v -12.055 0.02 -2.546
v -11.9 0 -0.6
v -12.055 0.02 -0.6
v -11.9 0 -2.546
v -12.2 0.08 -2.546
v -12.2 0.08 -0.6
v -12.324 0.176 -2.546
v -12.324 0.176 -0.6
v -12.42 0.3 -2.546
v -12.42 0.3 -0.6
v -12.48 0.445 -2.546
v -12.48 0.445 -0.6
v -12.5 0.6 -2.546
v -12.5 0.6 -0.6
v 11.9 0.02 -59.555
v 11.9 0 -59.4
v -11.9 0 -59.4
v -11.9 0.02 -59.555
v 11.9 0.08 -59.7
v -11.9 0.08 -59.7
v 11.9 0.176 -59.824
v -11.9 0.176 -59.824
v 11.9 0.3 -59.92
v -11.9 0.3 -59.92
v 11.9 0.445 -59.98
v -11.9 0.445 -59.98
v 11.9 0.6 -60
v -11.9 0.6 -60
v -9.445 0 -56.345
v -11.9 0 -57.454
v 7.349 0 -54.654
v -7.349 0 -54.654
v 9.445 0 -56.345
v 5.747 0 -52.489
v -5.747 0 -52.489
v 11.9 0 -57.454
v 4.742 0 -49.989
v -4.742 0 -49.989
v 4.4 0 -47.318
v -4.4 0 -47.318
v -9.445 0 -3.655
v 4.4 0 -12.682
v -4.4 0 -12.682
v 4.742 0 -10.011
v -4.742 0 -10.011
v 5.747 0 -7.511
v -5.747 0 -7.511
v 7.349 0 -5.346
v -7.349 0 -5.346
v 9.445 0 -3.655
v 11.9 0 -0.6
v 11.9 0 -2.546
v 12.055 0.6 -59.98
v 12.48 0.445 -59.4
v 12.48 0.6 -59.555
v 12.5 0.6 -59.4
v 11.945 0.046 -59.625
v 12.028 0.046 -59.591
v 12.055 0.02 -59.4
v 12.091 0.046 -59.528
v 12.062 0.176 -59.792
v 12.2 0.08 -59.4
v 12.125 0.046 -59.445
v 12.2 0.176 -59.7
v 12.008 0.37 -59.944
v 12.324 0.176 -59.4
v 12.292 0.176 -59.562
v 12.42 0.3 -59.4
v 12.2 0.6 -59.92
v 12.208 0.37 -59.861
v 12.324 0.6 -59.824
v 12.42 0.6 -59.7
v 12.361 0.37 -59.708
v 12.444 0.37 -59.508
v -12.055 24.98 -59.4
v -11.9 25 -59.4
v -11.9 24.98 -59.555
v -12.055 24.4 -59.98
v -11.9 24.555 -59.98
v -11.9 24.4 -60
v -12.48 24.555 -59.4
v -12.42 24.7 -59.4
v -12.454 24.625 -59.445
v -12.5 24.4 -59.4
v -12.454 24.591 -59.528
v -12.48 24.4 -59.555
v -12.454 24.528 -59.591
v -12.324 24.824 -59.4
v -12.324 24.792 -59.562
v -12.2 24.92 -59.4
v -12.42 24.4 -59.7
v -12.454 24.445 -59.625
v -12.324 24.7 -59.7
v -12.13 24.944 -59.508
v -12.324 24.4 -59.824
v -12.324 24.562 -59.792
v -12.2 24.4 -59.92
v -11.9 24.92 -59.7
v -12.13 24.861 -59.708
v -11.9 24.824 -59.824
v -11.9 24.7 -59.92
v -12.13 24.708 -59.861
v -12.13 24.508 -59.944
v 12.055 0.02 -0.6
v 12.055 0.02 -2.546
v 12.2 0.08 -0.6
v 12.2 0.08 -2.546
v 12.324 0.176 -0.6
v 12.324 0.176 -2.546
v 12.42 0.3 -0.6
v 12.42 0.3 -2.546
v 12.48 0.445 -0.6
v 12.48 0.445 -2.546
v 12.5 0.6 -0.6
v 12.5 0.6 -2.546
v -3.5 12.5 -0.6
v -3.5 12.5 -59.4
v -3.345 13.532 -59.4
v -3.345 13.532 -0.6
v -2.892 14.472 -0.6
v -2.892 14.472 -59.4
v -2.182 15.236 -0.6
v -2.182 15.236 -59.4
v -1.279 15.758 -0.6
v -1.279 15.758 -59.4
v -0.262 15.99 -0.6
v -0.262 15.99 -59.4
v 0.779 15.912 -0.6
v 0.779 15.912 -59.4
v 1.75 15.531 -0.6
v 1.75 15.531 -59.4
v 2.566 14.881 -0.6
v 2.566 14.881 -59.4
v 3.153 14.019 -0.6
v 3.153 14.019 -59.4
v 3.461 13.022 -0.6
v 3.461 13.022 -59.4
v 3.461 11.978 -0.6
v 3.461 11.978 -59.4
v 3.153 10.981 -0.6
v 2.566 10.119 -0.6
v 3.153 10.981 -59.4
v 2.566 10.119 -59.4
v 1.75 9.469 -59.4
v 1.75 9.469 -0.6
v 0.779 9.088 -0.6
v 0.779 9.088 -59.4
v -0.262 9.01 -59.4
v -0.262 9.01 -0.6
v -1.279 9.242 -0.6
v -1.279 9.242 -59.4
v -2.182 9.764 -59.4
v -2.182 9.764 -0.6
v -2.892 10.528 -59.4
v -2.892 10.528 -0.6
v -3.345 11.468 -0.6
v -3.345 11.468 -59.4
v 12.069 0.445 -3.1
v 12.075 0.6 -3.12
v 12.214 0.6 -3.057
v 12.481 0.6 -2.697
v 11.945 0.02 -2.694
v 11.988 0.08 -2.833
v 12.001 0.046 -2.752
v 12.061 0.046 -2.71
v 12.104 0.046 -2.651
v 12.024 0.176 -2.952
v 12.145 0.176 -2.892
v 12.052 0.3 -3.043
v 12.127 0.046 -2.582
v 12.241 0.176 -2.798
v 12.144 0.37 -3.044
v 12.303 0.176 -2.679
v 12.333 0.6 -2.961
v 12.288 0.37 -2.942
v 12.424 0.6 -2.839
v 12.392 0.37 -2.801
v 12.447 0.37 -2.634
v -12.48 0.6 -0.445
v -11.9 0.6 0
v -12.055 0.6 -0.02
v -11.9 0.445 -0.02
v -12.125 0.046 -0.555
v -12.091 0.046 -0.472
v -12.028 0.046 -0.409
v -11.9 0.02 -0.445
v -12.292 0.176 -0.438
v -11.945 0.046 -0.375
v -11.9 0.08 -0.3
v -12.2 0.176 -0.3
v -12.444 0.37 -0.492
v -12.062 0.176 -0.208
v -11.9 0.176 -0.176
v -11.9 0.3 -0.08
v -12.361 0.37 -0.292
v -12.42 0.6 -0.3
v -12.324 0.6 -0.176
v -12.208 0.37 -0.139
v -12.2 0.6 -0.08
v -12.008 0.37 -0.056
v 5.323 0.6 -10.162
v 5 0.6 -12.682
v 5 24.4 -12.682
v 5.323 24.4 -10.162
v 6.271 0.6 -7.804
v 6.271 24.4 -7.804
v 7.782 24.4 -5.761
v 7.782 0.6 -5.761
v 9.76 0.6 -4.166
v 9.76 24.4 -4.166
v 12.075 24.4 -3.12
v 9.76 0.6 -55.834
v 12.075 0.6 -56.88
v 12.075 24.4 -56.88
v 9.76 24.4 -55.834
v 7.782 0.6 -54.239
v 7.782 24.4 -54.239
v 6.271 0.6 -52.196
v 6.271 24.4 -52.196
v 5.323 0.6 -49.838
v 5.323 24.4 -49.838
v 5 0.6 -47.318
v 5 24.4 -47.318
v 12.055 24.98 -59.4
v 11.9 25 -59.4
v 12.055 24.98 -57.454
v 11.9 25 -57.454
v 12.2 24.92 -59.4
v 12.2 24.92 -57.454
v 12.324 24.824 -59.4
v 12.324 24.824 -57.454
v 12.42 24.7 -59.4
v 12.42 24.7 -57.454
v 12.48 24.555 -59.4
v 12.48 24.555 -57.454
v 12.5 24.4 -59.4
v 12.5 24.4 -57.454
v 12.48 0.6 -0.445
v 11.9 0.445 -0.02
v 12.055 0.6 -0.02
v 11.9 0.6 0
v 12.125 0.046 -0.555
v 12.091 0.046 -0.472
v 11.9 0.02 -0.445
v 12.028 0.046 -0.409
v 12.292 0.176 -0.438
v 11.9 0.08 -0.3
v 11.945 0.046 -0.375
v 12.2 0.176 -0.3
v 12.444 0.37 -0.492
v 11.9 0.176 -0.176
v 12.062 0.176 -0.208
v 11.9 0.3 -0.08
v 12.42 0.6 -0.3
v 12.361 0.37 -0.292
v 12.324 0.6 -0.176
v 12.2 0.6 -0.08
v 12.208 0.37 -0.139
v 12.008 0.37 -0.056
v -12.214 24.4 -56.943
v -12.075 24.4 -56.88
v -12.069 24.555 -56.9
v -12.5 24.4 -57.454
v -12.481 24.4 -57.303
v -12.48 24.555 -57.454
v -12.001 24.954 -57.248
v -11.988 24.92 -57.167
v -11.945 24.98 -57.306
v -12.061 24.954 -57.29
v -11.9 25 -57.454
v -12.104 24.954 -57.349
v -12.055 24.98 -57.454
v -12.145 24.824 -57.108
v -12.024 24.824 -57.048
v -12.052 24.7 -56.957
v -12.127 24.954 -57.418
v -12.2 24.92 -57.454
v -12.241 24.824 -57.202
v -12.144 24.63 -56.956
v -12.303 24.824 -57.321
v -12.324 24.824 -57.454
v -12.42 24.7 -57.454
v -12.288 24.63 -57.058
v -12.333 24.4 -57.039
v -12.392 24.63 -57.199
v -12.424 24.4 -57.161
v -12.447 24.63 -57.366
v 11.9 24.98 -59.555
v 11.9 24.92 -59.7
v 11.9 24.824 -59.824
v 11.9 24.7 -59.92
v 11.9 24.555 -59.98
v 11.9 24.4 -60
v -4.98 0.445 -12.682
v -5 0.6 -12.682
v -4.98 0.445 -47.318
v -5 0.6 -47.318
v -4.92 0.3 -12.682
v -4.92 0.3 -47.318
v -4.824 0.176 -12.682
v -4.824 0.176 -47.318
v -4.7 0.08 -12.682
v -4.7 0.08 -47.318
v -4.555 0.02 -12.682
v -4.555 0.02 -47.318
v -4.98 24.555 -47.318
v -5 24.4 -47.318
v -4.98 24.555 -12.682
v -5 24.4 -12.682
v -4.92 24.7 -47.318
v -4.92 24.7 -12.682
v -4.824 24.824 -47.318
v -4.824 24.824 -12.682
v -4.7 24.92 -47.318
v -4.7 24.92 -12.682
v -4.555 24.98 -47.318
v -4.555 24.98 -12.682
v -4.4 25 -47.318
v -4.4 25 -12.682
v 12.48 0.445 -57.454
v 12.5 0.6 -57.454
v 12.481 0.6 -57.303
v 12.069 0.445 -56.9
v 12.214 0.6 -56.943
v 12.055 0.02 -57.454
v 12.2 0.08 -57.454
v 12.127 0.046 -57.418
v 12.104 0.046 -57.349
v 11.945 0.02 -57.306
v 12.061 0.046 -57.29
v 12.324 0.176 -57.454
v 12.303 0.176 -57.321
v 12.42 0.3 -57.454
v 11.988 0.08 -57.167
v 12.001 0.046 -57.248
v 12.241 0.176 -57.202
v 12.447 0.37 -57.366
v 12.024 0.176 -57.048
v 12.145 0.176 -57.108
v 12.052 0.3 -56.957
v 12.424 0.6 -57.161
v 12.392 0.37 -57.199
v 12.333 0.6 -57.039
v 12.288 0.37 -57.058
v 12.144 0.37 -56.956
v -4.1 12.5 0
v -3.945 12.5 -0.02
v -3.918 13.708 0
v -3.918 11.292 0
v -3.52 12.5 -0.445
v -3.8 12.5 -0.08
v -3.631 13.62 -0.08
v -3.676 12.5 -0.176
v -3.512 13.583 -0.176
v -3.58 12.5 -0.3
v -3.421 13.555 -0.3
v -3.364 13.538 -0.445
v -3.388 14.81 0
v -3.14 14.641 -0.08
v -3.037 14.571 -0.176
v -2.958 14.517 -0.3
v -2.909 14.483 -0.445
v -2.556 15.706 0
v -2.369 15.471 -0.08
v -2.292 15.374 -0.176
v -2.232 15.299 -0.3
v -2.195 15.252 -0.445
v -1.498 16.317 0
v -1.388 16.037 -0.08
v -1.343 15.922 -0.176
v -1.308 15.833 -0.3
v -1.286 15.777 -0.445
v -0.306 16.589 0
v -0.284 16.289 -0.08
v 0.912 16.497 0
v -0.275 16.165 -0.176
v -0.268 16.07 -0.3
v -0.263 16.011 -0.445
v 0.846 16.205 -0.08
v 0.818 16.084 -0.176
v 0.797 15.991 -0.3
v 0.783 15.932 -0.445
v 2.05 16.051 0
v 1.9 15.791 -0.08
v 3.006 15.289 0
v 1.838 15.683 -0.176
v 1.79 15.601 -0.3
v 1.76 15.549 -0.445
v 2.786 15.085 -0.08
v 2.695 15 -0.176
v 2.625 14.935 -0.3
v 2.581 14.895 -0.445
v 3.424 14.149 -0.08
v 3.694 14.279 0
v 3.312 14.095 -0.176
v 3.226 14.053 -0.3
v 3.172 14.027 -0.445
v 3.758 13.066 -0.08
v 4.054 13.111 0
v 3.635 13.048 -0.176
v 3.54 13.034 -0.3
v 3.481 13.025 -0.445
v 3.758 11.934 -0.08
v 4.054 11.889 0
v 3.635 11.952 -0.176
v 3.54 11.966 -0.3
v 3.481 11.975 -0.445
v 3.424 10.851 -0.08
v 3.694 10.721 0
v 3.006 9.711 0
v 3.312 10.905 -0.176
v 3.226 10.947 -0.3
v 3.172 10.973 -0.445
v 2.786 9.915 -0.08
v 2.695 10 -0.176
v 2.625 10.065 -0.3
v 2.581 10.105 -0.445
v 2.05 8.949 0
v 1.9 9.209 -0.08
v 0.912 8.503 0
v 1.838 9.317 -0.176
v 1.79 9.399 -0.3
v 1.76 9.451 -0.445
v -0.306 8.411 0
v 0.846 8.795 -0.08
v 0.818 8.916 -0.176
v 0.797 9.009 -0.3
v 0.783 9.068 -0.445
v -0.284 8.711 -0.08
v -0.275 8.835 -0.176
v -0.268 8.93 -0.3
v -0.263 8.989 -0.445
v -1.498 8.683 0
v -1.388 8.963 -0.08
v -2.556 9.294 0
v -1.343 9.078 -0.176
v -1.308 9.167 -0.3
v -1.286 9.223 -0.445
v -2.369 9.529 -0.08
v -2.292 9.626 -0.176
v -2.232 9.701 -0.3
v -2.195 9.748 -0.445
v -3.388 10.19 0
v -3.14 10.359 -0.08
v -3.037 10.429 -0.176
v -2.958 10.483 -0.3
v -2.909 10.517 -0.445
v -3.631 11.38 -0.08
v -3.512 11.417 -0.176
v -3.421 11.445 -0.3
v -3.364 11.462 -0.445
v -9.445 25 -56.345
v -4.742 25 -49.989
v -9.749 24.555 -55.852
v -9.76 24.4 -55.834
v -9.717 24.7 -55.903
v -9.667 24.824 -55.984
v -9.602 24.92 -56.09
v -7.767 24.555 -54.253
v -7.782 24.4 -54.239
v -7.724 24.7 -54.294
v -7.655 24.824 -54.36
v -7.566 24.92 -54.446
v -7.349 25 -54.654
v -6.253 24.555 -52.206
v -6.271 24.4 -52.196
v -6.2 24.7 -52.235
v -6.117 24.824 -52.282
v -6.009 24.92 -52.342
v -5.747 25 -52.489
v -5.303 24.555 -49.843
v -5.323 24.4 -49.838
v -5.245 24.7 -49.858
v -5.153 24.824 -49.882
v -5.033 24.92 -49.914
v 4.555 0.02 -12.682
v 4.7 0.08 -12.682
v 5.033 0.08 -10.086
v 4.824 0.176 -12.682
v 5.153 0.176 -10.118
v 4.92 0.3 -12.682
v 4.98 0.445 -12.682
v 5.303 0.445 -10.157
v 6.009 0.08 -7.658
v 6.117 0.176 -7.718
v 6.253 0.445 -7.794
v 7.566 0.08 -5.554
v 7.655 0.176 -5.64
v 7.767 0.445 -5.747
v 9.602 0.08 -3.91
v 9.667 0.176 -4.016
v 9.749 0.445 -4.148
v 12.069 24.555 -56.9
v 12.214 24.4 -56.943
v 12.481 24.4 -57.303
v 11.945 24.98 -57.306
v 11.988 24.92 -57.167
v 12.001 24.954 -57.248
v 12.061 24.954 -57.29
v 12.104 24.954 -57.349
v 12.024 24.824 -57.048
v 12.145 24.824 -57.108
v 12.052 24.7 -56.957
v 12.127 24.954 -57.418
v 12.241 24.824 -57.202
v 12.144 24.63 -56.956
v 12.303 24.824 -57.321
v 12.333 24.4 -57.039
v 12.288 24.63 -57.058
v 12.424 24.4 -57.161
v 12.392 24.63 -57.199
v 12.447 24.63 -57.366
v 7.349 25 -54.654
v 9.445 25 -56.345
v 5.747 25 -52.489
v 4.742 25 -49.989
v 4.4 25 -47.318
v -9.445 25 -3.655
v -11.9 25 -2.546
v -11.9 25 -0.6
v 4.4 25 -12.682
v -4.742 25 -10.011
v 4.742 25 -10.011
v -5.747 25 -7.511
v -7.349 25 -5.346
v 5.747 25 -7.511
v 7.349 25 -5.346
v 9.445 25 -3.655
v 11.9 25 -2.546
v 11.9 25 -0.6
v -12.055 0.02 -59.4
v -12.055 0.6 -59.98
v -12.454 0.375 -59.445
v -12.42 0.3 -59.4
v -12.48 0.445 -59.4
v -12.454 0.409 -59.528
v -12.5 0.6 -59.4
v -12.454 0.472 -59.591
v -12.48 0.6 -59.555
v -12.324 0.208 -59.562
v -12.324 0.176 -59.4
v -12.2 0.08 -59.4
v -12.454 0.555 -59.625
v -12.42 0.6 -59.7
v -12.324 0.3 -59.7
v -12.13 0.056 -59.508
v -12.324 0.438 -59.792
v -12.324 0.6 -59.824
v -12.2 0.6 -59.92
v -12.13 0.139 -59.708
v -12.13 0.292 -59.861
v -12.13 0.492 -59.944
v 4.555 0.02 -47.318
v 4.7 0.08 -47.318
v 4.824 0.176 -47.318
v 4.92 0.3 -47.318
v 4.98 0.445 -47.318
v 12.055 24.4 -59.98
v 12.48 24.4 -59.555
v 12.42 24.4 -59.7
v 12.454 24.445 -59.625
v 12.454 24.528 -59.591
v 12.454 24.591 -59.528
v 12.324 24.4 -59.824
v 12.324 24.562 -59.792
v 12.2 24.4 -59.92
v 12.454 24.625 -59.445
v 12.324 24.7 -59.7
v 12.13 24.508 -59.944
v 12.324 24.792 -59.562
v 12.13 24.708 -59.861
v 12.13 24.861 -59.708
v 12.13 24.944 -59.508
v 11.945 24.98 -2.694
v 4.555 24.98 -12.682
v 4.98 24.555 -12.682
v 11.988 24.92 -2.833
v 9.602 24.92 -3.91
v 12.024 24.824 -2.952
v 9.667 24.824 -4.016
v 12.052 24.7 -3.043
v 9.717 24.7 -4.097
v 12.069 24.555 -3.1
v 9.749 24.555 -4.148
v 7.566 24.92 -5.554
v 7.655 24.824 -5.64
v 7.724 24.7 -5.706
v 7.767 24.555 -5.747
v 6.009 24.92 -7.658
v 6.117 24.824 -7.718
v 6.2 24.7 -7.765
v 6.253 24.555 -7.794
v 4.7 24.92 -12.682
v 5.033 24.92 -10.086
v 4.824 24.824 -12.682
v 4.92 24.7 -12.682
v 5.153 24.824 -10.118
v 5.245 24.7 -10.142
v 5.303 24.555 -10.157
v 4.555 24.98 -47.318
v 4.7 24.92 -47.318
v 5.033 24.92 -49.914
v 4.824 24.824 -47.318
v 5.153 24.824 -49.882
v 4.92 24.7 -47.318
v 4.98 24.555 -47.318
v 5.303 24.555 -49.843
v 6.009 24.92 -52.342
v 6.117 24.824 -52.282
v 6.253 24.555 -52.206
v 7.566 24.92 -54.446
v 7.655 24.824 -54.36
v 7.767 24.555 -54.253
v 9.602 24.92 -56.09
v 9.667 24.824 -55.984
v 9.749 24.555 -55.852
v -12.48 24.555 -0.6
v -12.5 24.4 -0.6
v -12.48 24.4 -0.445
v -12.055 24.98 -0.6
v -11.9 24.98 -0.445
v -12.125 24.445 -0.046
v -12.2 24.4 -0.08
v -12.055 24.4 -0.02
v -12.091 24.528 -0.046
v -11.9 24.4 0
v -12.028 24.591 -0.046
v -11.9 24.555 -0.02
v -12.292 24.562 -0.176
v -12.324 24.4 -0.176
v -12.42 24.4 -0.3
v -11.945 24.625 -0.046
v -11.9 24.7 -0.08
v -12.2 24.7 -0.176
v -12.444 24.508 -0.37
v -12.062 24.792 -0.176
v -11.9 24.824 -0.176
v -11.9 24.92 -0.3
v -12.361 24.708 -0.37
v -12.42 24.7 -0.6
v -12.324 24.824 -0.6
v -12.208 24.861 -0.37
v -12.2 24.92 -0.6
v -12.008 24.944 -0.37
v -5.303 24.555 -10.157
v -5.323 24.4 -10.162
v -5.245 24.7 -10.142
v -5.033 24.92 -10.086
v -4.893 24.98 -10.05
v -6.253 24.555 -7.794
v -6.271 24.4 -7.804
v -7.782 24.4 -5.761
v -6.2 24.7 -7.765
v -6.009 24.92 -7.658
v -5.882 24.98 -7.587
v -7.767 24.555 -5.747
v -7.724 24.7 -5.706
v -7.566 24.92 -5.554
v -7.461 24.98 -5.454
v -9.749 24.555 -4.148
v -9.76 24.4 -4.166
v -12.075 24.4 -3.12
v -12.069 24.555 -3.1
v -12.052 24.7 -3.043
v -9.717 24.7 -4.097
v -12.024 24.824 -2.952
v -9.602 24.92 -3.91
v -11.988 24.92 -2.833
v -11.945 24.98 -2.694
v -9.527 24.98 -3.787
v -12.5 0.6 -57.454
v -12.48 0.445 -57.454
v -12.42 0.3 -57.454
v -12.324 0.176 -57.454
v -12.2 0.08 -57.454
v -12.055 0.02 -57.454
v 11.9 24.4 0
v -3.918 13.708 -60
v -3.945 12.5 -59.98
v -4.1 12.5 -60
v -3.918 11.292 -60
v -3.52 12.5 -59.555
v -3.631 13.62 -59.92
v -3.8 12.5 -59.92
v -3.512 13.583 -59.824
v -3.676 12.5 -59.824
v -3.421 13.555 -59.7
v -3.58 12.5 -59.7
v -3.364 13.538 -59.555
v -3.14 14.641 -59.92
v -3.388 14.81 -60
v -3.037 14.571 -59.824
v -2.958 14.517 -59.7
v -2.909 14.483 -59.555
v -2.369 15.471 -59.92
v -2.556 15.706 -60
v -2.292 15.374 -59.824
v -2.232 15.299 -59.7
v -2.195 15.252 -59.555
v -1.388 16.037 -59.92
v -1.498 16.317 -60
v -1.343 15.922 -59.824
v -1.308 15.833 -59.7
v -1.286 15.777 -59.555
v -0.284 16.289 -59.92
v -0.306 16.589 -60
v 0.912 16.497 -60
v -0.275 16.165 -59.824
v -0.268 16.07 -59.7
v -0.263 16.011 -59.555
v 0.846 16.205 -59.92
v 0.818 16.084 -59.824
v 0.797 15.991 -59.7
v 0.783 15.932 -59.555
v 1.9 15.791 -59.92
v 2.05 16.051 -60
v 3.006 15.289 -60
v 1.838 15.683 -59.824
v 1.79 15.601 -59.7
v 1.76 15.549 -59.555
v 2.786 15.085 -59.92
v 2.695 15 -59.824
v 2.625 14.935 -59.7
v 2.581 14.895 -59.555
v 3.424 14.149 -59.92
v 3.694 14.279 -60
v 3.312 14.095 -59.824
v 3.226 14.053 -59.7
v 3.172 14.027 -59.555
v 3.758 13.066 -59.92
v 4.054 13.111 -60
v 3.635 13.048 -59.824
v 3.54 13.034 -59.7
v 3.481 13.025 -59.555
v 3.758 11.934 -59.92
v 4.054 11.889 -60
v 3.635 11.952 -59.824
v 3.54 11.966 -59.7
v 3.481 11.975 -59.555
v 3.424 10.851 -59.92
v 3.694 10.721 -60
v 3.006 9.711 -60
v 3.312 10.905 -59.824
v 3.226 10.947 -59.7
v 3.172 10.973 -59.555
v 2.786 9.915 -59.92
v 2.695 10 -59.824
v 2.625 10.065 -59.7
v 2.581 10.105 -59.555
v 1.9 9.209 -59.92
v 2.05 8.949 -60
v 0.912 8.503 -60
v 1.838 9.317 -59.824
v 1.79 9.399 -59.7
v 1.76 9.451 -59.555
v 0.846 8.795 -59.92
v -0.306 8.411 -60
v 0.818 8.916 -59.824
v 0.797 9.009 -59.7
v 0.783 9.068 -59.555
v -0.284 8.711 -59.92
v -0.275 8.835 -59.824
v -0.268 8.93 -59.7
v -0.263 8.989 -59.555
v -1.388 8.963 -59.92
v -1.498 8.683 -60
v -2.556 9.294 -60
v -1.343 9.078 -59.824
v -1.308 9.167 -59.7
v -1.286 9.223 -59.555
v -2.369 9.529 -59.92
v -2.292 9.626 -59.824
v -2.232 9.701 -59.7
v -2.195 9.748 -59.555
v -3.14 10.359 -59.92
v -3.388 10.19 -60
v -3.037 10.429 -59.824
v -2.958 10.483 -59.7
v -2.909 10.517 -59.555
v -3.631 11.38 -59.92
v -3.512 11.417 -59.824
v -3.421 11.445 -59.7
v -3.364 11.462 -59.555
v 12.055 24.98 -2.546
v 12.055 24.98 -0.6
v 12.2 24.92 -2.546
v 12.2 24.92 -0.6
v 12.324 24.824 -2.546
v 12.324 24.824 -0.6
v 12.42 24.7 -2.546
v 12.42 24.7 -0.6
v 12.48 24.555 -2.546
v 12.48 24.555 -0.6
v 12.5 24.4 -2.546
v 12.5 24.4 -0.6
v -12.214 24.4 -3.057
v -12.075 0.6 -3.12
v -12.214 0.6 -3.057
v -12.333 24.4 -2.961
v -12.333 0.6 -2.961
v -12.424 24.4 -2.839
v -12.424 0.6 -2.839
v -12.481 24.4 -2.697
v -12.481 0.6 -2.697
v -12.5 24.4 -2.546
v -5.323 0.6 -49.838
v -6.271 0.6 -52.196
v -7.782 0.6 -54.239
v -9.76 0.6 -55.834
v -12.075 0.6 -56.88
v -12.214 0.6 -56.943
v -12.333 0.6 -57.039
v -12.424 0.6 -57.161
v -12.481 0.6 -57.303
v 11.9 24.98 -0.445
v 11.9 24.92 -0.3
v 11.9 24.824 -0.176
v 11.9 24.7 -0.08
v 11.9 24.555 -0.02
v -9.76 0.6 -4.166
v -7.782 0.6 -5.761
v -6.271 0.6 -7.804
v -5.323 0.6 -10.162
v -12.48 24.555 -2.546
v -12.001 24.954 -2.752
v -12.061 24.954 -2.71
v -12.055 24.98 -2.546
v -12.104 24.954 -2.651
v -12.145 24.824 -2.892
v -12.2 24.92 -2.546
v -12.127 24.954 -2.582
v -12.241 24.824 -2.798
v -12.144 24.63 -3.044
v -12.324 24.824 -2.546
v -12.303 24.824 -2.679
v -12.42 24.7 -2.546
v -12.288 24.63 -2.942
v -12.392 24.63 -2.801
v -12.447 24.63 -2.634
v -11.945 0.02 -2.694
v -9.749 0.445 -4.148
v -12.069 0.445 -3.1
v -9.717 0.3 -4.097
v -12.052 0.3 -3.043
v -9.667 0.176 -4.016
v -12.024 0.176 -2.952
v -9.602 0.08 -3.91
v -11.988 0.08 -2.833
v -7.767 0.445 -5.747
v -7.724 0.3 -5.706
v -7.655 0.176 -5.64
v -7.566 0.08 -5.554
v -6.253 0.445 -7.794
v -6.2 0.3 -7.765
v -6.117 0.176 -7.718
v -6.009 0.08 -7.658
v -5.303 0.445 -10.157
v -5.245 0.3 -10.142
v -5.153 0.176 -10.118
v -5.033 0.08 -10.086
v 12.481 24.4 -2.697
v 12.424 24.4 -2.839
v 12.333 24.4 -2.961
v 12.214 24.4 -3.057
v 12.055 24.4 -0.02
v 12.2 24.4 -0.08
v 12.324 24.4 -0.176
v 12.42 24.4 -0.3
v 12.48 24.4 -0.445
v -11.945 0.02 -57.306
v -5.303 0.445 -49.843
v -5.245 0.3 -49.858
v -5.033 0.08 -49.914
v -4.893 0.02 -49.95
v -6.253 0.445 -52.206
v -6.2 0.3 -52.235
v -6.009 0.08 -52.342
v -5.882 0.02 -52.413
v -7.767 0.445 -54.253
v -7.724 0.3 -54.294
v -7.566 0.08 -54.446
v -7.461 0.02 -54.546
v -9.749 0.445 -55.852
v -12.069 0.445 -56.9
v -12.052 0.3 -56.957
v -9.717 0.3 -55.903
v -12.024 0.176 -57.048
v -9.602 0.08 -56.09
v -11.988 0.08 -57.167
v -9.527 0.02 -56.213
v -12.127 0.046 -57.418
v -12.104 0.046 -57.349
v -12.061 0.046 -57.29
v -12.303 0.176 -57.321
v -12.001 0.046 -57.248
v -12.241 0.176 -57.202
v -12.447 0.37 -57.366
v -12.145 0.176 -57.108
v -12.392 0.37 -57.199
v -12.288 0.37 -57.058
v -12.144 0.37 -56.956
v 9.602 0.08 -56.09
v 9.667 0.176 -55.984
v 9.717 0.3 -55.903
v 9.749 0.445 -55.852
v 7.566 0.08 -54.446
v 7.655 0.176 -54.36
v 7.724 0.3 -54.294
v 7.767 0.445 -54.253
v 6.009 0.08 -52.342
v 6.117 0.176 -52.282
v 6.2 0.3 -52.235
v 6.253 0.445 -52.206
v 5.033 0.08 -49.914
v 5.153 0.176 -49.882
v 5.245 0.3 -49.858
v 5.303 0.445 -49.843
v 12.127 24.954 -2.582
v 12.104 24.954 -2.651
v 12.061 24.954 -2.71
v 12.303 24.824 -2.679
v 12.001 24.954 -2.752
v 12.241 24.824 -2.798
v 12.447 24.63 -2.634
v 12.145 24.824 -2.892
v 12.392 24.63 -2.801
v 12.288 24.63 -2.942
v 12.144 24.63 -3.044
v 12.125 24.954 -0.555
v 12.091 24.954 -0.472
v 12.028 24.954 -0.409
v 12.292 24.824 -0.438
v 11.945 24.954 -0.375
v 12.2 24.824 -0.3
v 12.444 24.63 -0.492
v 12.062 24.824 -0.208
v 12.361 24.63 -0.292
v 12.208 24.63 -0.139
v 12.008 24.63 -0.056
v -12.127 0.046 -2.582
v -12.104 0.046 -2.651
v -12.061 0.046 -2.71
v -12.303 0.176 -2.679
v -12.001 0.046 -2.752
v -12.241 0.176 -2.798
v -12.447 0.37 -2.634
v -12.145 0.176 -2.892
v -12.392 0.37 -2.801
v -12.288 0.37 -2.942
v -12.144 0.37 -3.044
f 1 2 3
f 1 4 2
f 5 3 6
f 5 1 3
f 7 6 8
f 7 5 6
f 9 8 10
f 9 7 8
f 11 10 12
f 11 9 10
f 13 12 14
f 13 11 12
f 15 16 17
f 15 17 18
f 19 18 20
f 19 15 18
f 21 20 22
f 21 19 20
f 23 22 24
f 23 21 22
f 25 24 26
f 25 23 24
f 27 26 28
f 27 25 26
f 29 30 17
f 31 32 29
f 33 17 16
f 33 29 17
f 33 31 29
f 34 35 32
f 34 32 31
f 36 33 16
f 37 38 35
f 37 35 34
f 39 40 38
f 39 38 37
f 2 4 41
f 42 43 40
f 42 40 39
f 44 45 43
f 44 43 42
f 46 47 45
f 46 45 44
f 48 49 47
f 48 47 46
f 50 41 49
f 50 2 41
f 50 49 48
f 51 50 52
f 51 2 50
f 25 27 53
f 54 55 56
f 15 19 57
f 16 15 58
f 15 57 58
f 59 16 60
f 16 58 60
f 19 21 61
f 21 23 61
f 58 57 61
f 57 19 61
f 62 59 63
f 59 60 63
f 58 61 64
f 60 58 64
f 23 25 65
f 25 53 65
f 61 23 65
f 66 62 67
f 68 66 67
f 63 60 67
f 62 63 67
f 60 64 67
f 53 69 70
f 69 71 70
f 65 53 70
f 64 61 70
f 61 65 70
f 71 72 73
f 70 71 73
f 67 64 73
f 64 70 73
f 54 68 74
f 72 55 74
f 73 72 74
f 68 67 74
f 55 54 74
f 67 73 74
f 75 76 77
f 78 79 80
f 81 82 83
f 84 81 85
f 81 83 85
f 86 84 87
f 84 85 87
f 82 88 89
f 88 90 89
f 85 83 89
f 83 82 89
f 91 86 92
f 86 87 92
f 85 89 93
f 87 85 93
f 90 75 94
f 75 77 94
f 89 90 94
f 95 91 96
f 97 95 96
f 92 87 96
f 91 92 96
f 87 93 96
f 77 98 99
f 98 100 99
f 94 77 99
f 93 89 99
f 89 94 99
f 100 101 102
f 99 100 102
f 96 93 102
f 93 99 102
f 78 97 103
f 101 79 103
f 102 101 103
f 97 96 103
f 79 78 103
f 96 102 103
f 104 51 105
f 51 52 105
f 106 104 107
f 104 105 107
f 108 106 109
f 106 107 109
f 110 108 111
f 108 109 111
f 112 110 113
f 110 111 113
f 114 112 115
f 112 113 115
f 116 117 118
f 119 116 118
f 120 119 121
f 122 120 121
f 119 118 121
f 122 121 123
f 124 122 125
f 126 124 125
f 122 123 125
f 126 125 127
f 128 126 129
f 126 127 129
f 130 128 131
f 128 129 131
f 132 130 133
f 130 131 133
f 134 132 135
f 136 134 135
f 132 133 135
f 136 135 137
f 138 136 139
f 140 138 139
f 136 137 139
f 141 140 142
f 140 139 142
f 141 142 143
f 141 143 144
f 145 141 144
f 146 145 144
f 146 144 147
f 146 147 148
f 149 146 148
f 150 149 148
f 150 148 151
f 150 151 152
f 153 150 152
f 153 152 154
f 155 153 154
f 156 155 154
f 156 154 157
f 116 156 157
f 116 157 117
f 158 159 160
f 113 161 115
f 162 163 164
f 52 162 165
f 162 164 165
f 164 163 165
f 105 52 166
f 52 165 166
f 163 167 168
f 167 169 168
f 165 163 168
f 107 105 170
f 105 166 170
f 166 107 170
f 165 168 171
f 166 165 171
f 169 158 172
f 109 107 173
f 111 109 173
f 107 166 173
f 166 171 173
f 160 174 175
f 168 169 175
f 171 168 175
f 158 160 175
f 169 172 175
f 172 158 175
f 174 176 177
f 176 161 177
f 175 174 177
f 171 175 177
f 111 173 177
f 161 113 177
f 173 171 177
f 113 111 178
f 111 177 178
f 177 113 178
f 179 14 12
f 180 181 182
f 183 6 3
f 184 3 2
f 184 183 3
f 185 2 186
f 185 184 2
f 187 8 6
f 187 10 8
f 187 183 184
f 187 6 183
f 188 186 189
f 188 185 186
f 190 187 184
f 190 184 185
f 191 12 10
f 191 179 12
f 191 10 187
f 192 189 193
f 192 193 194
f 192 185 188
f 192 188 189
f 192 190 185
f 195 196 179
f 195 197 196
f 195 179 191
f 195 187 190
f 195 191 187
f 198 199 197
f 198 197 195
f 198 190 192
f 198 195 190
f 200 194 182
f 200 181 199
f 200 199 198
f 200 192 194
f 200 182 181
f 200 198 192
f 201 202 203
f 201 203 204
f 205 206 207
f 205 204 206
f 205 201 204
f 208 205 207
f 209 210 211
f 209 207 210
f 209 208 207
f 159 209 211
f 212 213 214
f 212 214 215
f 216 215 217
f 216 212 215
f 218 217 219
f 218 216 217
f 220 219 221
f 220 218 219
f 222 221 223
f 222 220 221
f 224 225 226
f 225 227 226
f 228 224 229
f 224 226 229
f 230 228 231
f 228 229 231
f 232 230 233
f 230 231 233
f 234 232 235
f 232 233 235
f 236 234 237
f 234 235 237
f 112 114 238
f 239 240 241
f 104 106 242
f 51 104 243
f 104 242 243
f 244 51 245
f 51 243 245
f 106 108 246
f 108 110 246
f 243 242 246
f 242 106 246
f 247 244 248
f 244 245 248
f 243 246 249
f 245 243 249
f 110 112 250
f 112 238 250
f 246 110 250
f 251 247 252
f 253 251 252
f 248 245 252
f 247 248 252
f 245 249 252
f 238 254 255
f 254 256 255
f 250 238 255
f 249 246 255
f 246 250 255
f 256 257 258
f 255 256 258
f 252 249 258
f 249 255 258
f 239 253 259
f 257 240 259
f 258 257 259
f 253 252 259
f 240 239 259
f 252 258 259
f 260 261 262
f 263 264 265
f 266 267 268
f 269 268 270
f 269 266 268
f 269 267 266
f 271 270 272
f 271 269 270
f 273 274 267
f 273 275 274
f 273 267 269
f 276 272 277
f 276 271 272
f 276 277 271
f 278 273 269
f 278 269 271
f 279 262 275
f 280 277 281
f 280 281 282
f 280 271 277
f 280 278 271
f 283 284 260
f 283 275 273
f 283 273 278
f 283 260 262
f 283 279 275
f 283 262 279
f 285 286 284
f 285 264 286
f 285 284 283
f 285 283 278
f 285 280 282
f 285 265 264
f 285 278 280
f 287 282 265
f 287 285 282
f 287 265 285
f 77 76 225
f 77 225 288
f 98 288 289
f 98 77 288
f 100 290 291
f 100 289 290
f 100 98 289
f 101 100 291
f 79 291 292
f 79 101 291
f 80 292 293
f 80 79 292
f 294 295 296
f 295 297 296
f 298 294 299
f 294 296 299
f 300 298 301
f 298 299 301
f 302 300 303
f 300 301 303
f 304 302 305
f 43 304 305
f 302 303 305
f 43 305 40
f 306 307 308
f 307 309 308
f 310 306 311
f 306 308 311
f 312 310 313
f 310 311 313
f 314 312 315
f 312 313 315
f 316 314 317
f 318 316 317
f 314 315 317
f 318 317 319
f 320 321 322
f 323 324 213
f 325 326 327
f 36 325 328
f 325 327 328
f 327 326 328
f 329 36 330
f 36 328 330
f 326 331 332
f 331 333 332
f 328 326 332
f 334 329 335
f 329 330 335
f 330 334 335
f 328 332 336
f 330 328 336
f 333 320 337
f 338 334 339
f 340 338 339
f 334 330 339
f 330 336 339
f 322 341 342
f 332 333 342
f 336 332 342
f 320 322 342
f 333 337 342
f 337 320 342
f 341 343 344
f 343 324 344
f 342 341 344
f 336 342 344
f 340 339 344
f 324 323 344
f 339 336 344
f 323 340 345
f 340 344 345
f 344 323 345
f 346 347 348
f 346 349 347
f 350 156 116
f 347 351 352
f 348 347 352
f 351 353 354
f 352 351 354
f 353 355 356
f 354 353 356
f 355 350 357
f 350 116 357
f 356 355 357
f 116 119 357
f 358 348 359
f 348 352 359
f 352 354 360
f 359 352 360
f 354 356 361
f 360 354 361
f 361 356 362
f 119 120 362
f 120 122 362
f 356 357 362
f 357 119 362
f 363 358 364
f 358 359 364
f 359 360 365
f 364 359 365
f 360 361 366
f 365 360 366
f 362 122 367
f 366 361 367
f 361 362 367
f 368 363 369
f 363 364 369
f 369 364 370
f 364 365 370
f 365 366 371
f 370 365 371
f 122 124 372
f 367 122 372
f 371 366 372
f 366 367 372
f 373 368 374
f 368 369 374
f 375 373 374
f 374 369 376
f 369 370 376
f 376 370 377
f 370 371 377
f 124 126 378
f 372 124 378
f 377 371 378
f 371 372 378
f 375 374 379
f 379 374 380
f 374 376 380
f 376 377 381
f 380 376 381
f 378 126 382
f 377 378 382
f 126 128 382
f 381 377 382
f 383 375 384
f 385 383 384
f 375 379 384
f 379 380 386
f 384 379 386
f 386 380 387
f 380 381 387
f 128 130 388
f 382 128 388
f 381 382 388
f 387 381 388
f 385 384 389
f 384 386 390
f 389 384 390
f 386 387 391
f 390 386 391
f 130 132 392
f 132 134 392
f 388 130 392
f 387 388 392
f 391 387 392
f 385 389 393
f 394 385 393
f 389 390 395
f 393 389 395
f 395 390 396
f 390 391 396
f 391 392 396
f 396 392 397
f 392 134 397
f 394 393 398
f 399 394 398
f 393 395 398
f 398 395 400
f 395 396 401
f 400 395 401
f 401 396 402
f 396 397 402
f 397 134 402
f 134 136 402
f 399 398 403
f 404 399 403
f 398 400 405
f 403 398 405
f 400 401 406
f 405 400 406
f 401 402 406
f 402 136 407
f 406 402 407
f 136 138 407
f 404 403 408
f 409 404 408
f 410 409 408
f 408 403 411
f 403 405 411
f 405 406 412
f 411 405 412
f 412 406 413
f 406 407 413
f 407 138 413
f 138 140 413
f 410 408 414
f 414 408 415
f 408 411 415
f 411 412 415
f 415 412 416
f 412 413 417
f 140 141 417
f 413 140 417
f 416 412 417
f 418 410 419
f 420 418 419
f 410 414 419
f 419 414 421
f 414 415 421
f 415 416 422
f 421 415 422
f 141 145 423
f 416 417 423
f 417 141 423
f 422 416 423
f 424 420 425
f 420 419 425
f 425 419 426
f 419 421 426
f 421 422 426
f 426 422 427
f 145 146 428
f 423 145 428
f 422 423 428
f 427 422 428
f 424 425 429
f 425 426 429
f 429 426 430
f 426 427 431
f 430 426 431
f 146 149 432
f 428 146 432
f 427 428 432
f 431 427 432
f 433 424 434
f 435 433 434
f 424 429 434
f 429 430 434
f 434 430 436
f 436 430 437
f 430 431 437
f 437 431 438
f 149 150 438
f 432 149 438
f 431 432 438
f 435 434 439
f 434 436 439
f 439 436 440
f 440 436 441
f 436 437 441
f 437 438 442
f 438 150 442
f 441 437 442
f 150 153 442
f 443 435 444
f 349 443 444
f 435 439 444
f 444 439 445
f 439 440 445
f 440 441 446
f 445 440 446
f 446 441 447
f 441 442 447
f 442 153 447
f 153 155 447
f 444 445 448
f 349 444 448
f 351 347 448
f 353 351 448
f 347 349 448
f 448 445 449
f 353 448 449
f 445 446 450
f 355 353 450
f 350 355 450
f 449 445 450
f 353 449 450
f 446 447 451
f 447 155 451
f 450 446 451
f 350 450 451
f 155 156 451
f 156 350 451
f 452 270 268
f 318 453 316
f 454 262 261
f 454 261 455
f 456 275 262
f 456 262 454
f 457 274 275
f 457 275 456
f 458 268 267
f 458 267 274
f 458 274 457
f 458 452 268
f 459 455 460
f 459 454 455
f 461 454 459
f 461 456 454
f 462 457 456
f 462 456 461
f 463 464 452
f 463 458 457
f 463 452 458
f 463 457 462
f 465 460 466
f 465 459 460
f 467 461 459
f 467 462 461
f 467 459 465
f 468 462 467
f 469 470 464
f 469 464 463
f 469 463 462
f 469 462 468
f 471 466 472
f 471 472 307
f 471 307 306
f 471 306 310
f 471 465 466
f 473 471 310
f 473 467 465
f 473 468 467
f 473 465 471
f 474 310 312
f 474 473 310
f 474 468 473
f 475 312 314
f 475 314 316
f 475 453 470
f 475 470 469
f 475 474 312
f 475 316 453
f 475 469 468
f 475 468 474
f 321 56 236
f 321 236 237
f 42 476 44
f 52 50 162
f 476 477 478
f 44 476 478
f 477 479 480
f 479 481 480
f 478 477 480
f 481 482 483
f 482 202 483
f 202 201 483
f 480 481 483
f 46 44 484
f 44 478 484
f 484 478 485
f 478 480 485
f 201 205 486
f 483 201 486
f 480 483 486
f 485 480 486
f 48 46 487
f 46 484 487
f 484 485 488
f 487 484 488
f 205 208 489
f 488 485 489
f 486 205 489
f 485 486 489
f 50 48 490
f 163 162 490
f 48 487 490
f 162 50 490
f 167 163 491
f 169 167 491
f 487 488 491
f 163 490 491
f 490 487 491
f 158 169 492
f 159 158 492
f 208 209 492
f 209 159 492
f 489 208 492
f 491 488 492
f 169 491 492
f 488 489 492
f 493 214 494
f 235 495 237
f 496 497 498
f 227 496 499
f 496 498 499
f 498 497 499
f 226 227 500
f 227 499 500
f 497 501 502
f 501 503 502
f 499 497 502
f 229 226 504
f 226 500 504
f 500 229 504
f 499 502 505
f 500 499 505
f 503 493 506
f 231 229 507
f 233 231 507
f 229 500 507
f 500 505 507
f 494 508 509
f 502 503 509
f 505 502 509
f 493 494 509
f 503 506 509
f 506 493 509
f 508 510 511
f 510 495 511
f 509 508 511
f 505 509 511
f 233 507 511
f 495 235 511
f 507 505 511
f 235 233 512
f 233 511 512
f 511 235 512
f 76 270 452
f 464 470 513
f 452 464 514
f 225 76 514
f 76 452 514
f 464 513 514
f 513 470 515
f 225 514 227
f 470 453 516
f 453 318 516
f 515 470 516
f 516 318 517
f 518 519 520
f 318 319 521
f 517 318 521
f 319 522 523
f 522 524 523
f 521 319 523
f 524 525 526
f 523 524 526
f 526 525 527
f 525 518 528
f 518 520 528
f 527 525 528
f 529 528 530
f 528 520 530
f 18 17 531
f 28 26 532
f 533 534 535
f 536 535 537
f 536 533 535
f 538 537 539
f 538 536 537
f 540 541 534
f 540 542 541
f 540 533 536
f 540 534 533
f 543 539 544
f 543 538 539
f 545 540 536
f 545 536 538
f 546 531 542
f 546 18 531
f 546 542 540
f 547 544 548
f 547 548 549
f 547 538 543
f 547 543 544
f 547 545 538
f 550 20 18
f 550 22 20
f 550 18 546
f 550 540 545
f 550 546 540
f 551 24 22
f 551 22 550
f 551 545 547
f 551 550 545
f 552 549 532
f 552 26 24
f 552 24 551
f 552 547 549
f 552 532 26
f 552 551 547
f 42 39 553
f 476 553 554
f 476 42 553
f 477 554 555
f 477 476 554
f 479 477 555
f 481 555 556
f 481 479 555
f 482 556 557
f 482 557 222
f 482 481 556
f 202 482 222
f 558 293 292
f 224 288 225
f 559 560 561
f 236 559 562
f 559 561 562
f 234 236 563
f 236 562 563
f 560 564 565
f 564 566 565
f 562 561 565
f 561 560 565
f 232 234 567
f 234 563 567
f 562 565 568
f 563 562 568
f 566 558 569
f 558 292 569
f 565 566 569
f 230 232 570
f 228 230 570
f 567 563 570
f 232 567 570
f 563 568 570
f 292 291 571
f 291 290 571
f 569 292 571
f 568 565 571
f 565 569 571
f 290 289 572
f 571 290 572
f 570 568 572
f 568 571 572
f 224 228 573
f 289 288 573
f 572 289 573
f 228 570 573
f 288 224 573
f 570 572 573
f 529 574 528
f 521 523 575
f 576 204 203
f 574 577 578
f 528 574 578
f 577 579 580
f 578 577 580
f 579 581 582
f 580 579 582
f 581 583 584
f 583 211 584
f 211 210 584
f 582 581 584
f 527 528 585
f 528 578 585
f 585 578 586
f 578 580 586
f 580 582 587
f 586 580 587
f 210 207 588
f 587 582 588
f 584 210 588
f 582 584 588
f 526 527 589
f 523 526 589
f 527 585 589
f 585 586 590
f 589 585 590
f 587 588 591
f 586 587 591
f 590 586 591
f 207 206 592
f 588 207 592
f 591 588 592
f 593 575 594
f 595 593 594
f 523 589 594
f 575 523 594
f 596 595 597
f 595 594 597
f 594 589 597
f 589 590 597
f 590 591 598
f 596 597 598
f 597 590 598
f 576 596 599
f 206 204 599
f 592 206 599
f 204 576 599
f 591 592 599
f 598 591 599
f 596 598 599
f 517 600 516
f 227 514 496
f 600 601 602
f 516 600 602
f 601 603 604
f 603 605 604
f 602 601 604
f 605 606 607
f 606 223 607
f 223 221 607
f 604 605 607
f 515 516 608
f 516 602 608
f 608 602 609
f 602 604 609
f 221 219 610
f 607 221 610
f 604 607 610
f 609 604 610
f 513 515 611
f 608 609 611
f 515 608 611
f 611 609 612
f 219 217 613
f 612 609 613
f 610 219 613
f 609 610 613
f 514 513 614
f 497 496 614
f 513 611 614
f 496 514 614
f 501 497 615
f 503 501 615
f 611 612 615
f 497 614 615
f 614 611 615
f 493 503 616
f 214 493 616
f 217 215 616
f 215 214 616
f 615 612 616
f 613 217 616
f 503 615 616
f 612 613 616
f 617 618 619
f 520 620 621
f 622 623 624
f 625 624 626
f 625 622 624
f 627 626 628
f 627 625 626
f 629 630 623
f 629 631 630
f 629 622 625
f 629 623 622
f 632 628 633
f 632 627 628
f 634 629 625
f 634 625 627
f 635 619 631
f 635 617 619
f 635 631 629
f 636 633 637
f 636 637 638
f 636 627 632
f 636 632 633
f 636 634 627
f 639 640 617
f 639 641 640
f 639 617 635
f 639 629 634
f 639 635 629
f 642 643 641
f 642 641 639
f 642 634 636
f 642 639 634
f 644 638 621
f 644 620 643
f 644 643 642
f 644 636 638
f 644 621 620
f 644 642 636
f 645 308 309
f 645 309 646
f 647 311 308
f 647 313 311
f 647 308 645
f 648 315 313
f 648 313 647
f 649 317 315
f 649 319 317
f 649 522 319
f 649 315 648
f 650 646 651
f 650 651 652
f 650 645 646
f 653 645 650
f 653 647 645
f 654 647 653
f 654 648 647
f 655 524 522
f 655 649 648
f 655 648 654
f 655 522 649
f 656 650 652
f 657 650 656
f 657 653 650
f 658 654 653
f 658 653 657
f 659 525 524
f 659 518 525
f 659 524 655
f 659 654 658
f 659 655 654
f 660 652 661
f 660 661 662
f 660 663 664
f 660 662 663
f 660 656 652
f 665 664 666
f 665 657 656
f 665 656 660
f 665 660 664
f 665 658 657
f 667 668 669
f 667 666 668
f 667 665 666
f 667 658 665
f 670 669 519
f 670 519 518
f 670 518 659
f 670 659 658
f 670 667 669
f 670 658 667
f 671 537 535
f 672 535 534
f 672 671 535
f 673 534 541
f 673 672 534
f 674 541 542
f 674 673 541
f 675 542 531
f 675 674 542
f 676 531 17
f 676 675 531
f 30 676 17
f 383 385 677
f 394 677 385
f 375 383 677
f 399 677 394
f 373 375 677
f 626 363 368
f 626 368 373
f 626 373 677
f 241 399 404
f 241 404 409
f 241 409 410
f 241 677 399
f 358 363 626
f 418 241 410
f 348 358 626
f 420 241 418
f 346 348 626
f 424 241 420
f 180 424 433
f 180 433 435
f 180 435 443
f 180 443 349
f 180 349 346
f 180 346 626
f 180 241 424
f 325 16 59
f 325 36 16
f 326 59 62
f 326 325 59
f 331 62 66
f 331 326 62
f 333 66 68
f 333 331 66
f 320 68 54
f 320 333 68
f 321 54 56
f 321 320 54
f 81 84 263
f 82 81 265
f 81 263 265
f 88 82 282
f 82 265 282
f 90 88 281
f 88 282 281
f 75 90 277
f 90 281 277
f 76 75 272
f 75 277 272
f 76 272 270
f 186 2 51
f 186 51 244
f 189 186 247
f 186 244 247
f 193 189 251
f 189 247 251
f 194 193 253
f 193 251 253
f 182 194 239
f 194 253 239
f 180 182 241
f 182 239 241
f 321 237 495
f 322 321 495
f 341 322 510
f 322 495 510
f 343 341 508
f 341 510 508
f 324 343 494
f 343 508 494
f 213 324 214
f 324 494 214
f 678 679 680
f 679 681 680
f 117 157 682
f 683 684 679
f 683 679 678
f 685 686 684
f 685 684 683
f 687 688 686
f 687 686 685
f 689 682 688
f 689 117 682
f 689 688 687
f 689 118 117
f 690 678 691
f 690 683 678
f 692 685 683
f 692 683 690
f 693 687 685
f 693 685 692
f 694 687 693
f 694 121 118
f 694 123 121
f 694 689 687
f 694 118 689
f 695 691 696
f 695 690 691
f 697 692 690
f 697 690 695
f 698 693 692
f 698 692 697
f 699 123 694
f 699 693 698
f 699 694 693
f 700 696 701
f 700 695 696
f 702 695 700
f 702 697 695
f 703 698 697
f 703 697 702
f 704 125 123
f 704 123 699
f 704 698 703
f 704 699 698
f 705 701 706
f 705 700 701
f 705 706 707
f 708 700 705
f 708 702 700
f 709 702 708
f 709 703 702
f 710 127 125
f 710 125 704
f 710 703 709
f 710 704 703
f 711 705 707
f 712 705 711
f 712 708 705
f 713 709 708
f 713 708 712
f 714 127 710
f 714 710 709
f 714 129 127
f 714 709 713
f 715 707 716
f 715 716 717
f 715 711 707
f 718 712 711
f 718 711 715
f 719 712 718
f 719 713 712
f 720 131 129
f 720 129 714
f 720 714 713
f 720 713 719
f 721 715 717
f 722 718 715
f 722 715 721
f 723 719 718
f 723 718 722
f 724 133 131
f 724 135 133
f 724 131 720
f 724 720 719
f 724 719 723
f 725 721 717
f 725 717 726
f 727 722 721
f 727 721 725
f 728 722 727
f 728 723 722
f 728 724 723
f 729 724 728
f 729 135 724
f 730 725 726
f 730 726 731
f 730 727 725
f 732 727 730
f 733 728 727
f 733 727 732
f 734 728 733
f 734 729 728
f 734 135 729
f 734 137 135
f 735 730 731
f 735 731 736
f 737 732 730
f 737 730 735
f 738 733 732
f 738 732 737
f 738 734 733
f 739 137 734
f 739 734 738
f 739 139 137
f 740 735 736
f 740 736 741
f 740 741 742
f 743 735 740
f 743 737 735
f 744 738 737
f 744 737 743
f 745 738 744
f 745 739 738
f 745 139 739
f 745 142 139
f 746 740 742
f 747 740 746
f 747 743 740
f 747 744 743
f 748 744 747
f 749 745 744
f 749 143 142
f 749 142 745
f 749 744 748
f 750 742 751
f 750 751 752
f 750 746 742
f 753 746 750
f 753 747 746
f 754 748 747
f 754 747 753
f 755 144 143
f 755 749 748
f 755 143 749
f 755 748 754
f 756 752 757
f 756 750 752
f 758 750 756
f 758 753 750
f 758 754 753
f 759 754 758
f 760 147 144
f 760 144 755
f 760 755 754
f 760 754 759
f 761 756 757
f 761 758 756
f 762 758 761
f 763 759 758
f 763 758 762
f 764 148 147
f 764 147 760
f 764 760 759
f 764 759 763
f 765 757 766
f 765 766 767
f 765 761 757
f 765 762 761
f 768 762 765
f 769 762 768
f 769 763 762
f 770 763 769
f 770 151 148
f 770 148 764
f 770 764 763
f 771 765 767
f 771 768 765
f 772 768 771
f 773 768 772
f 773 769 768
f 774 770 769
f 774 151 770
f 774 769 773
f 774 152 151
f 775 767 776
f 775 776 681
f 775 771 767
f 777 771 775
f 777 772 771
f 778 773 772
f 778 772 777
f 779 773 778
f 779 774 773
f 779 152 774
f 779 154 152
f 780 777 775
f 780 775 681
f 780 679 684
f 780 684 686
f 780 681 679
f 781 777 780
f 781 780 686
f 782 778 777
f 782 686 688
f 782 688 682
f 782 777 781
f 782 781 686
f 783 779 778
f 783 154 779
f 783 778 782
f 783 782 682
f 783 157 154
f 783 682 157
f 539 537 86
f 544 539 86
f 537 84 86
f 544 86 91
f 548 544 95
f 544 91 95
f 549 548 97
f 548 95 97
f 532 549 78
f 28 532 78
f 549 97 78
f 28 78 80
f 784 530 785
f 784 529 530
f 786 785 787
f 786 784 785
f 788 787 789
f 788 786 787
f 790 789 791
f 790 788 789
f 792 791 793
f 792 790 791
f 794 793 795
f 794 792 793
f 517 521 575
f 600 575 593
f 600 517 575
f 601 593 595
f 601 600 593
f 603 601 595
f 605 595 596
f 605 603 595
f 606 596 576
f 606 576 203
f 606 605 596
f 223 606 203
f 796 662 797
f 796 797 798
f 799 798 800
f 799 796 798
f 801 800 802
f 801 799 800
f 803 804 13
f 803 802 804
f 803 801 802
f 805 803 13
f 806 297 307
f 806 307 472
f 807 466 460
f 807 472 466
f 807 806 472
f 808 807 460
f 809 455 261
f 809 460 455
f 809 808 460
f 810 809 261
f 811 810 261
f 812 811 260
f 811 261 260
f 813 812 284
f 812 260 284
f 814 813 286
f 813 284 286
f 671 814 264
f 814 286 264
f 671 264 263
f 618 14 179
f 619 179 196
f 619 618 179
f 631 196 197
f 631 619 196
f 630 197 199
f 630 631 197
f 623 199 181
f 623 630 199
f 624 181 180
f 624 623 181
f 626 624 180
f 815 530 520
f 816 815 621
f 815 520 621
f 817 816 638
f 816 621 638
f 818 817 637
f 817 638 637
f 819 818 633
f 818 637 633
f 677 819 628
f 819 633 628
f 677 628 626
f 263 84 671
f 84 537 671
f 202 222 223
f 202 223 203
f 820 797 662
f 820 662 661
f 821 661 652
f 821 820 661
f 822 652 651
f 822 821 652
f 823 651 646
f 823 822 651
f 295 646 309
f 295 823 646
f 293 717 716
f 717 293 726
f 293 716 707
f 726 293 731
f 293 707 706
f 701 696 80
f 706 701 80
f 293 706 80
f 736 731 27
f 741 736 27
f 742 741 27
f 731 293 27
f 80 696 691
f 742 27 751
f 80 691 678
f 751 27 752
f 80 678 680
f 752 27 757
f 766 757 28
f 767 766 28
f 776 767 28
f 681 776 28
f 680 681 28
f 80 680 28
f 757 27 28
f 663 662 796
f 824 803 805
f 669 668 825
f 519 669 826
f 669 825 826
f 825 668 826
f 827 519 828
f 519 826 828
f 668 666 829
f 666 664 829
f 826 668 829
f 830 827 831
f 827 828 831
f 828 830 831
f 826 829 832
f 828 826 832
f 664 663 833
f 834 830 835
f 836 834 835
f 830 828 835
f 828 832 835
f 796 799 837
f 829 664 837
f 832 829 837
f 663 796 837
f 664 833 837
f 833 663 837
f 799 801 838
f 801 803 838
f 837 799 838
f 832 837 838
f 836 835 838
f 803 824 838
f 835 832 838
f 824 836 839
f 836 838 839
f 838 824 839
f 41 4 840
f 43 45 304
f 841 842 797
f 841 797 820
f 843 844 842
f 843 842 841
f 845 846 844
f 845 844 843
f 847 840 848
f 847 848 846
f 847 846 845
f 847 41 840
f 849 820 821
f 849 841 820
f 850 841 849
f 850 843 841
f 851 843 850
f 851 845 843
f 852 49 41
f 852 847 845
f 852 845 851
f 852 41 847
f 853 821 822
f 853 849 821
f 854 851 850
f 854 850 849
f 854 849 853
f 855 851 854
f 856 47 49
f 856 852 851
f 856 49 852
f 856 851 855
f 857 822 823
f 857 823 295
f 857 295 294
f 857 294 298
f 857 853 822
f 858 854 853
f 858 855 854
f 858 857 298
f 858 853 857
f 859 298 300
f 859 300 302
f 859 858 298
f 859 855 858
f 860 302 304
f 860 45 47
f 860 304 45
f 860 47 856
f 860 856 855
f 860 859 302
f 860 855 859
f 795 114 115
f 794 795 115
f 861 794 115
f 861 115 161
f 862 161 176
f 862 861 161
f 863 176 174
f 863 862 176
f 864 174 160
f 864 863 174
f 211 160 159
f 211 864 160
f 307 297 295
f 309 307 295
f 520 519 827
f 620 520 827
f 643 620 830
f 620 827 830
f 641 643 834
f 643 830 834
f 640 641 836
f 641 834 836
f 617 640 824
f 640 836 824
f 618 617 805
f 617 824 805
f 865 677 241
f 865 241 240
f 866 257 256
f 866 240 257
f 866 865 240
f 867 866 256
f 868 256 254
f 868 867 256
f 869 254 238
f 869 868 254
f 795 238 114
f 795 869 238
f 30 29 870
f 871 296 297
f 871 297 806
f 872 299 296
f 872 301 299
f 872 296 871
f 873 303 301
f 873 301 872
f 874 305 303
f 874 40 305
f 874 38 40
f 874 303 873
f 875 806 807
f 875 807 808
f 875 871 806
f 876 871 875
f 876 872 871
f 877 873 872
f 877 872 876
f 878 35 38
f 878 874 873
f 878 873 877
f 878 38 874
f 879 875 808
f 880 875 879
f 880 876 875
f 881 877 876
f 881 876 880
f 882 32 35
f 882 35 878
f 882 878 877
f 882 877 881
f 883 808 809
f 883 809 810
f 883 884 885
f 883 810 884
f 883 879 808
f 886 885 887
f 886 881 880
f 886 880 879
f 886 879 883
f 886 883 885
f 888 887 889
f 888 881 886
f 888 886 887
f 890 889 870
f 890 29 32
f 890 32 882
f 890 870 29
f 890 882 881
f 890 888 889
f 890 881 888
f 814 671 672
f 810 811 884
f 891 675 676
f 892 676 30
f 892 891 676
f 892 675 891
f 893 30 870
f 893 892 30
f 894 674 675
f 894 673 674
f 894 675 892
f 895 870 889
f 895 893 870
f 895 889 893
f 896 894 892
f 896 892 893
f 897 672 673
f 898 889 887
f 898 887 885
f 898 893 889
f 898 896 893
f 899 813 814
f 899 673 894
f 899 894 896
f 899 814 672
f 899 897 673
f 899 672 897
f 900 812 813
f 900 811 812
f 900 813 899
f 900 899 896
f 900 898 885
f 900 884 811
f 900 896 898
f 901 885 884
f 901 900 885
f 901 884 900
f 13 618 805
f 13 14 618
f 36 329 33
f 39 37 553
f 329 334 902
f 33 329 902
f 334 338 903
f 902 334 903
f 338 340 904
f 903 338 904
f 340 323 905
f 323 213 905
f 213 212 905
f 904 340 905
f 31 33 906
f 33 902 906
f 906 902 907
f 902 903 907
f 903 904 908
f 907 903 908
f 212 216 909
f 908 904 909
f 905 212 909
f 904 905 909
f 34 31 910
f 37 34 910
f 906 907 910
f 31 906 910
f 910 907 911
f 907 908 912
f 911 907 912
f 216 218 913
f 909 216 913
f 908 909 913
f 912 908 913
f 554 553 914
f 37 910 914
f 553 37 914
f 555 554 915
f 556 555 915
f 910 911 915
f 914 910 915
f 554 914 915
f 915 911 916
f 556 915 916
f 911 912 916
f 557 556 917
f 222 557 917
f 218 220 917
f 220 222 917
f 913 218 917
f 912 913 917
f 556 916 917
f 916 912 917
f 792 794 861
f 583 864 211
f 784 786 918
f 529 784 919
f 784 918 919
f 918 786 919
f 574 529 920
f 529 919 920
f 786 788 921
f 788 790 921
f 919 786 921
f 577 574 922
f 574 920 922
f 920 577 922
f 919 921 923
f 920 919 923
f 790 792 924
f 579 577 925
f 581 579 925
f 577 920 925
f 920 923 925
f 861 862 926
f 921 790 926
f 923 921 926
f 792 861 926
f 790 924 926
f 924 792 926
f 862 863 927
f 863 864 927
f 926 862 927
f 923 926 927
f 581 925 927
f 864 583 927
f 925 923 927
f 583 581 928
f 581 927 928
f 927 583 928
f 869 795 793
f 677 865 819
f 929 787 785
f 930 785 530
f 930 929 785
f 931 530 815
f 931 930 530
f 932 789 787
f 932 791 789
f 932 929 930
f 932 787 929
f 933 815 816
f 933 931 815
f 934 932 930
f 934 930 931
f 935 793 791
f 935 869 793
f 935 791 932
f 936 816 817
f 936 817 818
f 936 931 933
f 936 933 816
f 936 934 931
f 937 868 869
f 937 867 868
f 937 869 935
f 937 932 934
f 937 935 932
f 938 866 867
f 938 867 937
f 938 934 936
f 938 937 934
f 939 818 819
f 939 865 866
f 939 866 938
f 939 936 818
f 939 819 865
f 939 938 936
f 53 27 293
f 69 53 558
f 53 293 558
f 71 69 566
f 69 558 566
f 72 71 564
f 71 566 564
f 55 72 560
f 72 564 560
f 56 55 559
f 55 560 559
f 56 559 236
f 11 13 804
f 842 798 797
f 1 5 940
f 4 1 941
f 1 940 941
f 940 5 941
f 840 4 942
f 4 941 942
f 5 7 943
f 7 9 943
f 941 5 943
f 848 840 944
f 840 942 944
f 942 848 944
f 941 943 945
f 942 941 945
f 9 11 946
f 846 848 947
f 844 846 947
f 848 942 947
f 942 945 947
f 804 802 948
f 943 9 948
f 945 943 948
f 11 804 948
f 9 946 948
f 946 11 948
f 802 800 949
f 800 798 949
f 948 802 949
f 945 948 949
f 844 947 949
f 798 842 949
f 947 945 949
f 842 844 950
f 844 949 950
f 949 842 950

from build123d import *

# Parameters (mm, degrees)
SALIENTE_EXTRUIR1_DEPTH = 25
CROQUIS2_R              = 3.5
CORTAR_EXTRUIR1_DEPTH   = 67.191011474
REDONDEO1_R             = 10
REDONDEO2_R             = 0.6


with BuildPart() as part:
    # Croquis1 → Saliente-Extruir1 (new body)
    with BuildSketch(Plane(origin=(0, 0, 0), x_dir=(1, 0, 0), z_dir=(0, 1, 0))):
        Polygon((0, 0), (12.5, 0), (12.5, 3), (5, 3), (5, 30), (0, 30), align=None)
    saliente_extruir1 = extrude(amount=SALIENTE_EXTRUIR1_DEPTH)

    # Simetría1: Saliente-Extruir1 across plane
    add(saliente_extruir1.mirror(Plane(origin=(0, 25, -30), x_dir=(0, 0, 1), z_dir=(1, 0, 0))))

    # Simetría8: part across plane


with BuildPart() as part_1:
    add(part.part)
    add(part.part.mirror(Plane(origin=(5, 25, -30), x_dir=(1, 0, 0), z_dir=(0, 0, 1))))

    # Croquis2 → Cortar-Extruir1 (cut, through all)
    with BuildSketch(Plane(origin=(0, 0, -60), x_dir=(-1, 0, 0), z_dir=(0, 0, -1))):
        with Locations((0, 12.5)):
            Circle(CROQUIS2_R)
    extrude(amount=-CORTAR_EXTRUIR1_DEPTH, mode=Mode.SUBTRACT)

    # Redondeo1
    # the kernel refuses this fillet: 10 mm, written as the material it adds along each edge
    with BuildSketch(Plane(origin=(5, 0, -57), x_dir=(0, 0, 1), z_dir=(0, 1, 0)), Plane(origin=(-5, 0, -3), x_dir=(0, 0, -1), z_dir=(0, 1, 0))) as redondeo1_piece_1:
        with BuildLine():
            CenterArc((9.682458366, 10), REDONDEO1_R, 194.477512186, 75.522487814)
            Line((0, 7.5), (-0.193649167, 7.45))
            ThreePointArc((-0.193649167, 7.45), (-0.2, 3.75), (-0.2, 0))
            Line((-0.2, 0), (0, -0.2))
            Line((0, -0.2), (9.682458366, -0.2))
            Line((9.682458366, -0.2), (9.682458366, 0))
        make_face()
    extrude(amount=25)
    with BuildSketch(Plane(origin=(-5, 0, -57), x_dir=(-1, 0, 0), z_dir=(0, 1, 0)), Plane(origin=(5, 0, -3), x_dir=(1, 0, 0), z_dir=(0, 1, 0))) as redondeo1_piece_2:
        with BuildLine():
            CenterArc((10, 9.682458366), REDONDEO1_R, 180, 75.522487814)
            Line((0, 9.682458366), (-0.2, 9.682458366))
            Line((-0.2, 9.682458366), (-0.2, 0))
            Line((-0.2, 0), (0, -0.2))
            ThreePointArc((0, -0.2), (3.75, -0.2), (7.45, -0.193649167))
            Line((7.45, -0.193649167), (7.5, 0))
        make_face()
    extrude(amount=25)

    # Redondeo2
    redondeo2_edges = [part_1.edges().sort_by_distance(p)[0] for p in [
        (12.5, 12.5, -3),
        (12.5, 12.5, 0),
        (12.5, 25, -1.5),
        (-12.5, 25, -1.5),
        (-12.5, 12.5, -3),
        (-12.5, 12.5, 0),
        (-12.5, 0, -1.5),
        (0, 25, -60),
        (12.5, 12.5, -60),
        (12.5, 25, -58.5),
        (12.5, 12.5, -57),
        (-12.5, 25, -58.5),
        (0, 0, -60),
        (12.5, 0, -58.5),
        (-12.5, 12.5, -57),
        (-12.5, 0, -58.5),
        (-12.5, 12.5, -60),
        (3.5, 12.5, 0),
        (3.5, 12.5, -60),
        (-5, 0, -30),
        (-5, 25, -30),
        (5, 0, -30),
        (5, 25, -30),
        (-7.09430585, 0, -6.558734009),
        (-7.09430585, 25, -6.558734009),
        (7.09430585, 0, -6.558734009),
        (7.09430585, 25, -6.558734009),
        (7.09430585, 0, -53.441265991),
        (7.09430585, 25, -53.441265991),
        (-7.09430585, 0, -53.441265991),
        (-7.09430585, 25, -53.441265991),
        (12.5, 0, -1.5),
        (0, 0, 0),
        (0, 25, 0),
    ]]
    fillet(redondeo2_edges, radius=REDONDEO2_R)


solid = part_1.part
